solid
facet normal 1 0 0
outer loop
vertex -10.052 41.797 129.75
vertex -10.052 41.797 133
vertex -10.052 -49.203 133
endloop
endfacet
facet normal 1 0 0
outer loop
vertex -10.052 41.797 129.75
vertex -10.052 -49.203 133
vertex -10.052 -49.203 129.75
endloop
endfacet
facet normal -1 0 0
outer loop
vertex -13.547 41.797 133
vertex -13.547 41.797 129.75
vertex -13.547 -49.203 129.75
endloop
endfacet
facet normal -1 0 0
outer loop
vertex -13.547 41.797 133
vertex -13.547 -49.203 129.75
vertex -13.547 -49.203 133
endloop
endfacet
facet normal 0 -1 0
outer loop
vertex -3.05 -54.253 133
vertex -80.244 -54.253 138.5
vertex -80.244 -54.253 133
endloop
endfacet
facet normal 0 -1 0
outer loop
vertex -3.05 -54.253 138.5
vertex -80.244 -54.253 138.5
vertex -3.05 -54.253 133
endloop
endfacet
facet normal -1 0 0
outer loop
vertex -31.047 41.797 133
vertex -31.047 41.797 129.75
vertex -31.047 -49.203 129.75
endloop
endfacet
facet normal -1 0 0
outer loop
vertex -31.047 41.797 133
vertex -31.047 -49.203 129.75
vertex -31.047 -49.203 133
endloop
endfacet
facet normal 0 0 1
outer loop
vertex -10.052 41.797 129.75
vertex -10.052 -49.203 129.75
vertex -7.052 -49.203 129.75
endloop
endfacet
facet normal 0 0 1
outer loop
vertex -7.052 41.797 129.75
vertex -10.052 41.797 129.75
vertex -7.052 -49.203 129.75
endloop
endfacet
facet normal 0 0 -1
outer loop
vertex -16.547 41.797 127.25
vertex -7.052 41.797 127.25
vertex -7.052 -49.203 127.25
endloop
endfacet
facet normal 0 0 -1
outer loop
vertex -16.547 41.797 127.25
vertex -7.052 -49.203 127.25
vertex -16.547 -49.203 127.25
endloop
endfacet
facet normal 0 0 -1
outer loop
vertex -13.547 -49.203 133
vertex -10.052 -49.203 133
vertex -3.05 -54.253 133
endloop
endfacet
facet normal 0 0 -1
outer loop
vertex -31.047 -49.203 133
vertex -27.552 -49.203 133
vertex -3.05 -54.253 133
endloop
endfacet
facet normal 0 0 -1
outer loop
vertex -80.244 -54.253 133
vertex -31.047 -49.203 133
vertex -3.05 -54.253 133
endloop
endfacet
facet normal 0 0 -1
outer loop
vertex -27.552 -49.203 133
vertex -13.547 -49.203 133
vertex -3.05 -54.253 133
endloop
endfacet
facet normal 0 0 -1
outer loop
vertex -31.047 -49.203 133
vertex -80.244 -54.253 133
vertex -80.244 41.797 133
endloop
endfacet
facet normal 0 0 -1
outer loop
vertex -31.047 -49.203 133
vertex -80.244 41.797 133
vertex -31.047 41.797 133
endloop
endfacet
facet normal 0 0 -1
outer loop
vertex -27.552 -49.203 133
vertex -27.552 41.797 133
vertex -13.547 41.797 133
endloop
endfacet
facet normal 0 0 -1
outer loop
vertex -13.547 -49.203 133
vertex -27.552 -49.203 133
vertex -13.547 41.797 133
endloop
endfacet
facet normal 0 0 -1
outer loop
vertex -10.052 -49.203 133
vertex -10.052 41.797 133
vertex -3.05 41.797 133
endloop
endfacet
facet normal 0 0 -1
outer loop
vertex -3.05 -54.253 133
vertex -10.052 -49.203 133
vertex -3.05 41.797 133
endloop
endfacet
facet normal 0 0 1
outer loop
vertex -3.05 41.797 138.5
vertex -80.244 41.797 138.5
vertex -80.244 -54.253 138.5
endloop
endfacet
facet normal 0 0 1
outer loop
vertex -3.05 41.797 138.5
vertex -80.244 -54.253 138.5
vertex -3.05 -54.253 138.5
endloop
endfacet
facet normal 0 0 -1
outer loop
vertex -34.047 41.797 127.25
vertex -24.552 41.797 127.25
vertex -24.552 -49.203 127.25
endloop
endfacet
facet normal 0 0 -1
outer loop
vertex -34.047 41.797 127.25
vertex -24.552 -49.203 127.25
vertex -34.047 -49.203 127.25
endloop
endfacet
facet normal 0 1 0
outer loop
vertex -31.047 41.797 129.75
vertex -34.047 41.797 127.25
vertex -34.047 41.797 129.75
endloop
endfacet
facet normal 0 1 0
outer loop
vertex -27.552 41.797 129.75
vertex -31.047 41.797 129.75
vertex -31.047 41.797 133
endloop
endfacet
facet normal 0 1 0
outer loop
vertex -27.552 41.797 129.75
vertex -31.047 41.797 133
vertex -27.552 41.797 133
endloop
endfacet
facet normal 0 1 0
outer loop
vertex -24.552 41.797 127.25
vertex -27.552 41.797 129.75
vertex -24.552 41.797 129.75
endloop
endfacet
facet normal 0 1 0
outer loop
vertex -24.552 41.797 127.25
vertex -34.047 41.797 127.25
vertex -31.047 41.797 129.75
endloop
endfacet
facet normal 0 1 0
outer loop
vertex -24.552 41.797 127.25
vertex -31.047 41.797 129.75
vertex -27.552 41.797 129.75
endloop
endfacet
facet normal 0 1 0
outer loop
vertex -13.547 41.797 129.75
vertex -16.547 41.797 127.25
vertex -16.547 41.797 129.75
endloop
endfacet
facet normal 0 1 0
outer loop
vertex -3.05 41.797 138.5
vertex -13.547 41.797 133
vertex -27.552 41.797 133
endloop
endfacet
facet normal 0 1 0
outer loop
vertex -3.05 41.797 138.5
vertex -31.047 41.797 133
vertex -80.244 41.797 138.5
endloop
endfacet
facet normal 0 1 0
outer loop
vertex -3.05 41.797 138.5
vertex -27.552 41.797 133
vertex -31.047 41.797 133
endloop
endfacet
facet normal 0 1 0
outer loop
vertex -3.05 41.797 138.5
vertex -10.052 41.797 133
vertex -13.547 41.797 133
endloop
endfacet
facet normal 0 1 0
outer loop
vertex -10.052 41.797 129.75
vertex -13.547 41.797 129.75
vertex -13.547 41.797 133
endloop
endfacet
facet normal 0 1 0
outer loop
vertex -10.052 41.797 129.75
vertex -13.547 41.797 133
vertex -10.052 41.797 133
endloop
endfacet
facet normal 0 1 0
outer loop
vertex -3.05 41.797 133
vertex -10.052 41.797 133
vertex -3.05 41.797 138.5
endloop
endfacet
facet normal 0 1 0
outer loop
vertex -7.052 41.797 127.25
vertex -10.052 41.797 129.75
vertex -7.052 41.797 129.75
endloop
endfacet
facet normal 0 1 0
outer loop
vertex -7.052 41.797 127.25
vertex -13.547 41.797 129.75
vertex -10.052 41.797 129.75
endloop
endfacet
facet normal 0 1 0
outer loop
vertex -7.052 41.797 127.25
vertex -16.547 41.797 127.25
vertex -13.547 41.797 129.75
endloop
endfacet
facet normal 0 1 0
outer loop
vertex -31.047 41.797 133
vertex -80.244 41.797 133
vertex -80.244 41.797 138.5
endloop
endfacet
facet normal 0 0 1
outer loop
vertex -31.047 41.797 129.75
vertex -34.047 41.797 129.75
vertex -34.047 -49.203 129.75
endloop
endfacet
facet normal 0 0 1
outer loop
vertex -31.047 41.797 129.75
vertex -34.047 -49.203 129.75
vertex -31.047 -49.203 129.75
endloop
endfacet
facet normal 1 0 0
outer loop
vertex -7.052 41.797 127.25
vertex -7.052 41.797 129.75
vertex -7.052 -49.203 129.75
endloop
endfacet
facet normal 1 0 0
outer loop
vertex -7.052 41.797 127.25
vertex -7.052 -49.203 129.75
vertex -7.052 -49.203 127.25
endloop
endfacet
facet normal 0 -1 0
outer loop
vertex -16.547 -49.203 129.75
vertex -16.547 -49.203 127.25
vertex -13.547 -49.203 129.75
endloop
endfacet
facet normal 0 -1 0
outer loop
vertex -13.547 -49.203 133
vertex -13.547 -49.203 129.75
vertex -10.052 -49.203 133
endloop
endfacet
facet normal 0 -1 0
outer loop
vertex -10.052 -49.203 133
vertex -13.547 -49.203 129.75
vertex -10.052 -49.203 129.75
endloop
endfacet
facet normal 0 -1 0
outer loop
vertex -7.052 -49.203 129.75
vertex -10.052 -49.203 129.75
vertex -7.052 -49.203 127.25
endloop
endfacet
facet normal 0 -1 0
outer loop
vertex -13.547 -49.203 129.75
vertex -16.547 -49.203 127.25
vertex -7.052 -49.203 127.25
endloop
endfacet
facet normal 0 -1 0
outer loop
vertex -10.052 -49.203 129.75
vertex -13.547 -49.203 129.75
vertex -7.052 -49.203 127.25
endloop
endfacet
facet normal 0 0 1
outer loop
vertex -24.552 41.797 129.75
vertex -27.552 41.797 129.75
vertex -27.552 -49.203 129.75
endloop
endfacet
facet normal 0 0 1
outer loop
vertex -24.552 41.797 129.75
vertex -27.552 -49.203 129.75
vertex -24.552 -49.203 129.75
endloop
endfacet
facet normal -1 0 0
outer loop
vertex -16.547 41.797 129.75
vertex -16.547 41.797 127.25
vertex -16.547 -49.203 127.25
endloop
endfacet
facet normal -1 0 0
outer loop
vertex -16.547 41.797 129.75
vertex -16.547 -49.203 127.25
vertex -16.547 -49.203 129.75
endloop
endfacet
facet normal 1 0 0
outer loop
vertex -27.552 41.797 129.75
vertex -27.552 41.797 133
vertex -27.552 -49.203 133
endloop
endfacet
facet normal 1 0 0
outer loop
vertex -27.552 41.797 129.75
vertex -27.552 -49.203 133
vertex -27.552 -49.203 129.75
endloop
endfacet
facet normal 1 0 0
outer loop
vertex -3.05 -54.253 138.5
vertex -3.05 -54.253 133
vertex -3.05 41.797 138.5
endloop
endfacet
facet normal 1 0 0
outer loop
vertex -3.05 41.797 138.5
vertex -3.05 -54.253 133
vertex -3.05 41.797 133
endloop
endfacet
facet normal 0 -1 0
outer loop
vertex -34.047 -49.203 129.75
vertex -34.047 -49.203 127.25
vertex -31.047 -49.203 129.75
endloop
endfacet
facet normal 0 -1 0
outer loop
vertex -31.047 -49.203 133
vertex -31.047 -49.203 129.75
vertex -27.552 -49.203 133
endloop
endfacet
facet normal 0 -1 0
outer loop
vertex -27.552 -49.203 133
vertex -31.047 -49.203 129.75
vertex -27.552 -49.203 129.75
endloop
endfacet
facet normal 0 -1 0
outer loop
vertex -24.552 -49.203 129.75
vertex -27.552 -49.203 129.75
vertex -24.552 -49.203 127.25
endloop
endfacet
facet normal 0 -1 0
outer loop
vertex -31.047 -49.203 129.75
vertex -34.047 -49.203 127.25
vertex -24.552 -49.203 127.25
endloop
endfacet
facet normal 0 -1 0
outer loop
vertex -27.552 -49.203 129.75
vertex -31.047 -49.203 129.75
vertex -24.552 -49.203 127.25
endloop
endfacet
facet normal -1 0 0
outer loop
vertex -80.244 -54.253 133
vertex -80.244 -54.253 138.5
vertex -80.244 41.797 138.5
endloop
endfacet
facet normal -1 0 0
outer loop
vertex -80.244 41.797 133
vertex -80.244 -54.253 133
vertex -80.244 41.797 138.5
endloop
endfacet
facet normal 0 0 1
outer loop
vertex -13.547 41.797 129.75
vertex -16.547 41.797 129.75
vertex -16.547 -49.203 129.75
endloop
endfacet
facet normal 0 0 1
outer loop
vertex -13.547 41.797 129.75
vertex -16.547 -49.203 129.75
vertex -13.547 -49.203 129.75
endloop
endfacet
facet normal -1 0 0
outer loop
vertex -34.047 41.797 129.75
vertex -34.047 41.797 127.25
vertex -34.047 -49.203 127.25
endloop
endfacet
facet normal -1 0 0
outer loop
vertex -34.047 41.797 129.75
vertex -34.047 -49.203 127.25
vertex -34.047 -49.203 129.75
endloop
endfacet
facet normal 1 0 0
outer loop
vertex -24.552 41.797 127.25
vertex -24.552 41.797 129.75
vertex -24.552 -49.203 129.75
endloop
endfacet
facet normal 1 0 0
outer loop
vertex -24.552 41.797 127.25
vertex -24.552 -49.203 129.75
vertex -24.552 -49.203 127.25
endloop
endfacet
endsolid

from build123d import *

# Parameters (mm, degrees)
SKETCH_1_W          = 120
SKETCH_1_H          = 140
EXTRUDE_1_DEPTH     = 5.5
EXTRUDE_13_DEPTH    = 91
SKETCH_26_W         = 120
SKETCH_26_H         = 43.949941981
CUT_EXTRUDE_1_DEPTH = 10
SKETCH_27_W         = 42.806130355
SKETCH_27_H         = 96.050058019
CUT_EXTRUDE_2_DEPTH = 12.25


with BuildPart() as part:
    # 草图1 → 凸台-拉伸1 (new body)
    with BuildSketch(Plane.XY.offset(133)):
        with Locations((-63.049709027, -28.203400415)):
            Rectangle(SKETCH_1_W, SKETCH_1_H)
    extrude(amount=EXTRUDE_1_DEPTH)

    # 草图25 → 凸台-拉伸13 (add)
    with BuildSketch(Plane(origin=(0, 41.796599585, 0), x_dir=(1, 0, 0), z_dir=(0, 1, 0))):
        Polygon((-10.052220086, -133), (-10.052220086, -129.75), (-7.052220086, -129.75), (-7.052220086, -127.25), (-16.547197967, -127.25), (-16.547197967, -129.75), (-13.547197967, -129.75), (-13.547197967, -133), align=None)
        Polygon((-27.552220086, -133), (-27.552220086, -129.75), (-24.552220086, -129.75), (-24.552220086, -127.25), (-34.047197967, -127.25), (-34.047197967, -129.75), (-31.047197967, -129.75), (-31.047197967, -133), align=None)
    extrude(amount=-EXTRUDE_13_DEPTH)

    # 草图26 → 切除-拉伸1 (cut)
    with BuildSketch(Plane.XY.offset(138.5)):
        with Locations((-63.049709027, -76.228429425)):
            Rectangle(SKETCH_26_W, SKETCH_26_H)
    extrude(amount=-CUT_EXTRUDE_1_DEPTH, mode=Mode.SUBTRACT)

    # 草图27 → 切除-拉伸2 (cut, through all)
    with BuildSketch(Plane.XY.offset(138.5)):
        with Locations((-101.64664385, -6.228429424)):
            Rectangle(SKETCH_27_W, SKETCH_27_H)
    extrude(amount=-CUT_EXTRUDE_2_DEPTH, mode=Mode.SUBTRACT)


solid = part.part
